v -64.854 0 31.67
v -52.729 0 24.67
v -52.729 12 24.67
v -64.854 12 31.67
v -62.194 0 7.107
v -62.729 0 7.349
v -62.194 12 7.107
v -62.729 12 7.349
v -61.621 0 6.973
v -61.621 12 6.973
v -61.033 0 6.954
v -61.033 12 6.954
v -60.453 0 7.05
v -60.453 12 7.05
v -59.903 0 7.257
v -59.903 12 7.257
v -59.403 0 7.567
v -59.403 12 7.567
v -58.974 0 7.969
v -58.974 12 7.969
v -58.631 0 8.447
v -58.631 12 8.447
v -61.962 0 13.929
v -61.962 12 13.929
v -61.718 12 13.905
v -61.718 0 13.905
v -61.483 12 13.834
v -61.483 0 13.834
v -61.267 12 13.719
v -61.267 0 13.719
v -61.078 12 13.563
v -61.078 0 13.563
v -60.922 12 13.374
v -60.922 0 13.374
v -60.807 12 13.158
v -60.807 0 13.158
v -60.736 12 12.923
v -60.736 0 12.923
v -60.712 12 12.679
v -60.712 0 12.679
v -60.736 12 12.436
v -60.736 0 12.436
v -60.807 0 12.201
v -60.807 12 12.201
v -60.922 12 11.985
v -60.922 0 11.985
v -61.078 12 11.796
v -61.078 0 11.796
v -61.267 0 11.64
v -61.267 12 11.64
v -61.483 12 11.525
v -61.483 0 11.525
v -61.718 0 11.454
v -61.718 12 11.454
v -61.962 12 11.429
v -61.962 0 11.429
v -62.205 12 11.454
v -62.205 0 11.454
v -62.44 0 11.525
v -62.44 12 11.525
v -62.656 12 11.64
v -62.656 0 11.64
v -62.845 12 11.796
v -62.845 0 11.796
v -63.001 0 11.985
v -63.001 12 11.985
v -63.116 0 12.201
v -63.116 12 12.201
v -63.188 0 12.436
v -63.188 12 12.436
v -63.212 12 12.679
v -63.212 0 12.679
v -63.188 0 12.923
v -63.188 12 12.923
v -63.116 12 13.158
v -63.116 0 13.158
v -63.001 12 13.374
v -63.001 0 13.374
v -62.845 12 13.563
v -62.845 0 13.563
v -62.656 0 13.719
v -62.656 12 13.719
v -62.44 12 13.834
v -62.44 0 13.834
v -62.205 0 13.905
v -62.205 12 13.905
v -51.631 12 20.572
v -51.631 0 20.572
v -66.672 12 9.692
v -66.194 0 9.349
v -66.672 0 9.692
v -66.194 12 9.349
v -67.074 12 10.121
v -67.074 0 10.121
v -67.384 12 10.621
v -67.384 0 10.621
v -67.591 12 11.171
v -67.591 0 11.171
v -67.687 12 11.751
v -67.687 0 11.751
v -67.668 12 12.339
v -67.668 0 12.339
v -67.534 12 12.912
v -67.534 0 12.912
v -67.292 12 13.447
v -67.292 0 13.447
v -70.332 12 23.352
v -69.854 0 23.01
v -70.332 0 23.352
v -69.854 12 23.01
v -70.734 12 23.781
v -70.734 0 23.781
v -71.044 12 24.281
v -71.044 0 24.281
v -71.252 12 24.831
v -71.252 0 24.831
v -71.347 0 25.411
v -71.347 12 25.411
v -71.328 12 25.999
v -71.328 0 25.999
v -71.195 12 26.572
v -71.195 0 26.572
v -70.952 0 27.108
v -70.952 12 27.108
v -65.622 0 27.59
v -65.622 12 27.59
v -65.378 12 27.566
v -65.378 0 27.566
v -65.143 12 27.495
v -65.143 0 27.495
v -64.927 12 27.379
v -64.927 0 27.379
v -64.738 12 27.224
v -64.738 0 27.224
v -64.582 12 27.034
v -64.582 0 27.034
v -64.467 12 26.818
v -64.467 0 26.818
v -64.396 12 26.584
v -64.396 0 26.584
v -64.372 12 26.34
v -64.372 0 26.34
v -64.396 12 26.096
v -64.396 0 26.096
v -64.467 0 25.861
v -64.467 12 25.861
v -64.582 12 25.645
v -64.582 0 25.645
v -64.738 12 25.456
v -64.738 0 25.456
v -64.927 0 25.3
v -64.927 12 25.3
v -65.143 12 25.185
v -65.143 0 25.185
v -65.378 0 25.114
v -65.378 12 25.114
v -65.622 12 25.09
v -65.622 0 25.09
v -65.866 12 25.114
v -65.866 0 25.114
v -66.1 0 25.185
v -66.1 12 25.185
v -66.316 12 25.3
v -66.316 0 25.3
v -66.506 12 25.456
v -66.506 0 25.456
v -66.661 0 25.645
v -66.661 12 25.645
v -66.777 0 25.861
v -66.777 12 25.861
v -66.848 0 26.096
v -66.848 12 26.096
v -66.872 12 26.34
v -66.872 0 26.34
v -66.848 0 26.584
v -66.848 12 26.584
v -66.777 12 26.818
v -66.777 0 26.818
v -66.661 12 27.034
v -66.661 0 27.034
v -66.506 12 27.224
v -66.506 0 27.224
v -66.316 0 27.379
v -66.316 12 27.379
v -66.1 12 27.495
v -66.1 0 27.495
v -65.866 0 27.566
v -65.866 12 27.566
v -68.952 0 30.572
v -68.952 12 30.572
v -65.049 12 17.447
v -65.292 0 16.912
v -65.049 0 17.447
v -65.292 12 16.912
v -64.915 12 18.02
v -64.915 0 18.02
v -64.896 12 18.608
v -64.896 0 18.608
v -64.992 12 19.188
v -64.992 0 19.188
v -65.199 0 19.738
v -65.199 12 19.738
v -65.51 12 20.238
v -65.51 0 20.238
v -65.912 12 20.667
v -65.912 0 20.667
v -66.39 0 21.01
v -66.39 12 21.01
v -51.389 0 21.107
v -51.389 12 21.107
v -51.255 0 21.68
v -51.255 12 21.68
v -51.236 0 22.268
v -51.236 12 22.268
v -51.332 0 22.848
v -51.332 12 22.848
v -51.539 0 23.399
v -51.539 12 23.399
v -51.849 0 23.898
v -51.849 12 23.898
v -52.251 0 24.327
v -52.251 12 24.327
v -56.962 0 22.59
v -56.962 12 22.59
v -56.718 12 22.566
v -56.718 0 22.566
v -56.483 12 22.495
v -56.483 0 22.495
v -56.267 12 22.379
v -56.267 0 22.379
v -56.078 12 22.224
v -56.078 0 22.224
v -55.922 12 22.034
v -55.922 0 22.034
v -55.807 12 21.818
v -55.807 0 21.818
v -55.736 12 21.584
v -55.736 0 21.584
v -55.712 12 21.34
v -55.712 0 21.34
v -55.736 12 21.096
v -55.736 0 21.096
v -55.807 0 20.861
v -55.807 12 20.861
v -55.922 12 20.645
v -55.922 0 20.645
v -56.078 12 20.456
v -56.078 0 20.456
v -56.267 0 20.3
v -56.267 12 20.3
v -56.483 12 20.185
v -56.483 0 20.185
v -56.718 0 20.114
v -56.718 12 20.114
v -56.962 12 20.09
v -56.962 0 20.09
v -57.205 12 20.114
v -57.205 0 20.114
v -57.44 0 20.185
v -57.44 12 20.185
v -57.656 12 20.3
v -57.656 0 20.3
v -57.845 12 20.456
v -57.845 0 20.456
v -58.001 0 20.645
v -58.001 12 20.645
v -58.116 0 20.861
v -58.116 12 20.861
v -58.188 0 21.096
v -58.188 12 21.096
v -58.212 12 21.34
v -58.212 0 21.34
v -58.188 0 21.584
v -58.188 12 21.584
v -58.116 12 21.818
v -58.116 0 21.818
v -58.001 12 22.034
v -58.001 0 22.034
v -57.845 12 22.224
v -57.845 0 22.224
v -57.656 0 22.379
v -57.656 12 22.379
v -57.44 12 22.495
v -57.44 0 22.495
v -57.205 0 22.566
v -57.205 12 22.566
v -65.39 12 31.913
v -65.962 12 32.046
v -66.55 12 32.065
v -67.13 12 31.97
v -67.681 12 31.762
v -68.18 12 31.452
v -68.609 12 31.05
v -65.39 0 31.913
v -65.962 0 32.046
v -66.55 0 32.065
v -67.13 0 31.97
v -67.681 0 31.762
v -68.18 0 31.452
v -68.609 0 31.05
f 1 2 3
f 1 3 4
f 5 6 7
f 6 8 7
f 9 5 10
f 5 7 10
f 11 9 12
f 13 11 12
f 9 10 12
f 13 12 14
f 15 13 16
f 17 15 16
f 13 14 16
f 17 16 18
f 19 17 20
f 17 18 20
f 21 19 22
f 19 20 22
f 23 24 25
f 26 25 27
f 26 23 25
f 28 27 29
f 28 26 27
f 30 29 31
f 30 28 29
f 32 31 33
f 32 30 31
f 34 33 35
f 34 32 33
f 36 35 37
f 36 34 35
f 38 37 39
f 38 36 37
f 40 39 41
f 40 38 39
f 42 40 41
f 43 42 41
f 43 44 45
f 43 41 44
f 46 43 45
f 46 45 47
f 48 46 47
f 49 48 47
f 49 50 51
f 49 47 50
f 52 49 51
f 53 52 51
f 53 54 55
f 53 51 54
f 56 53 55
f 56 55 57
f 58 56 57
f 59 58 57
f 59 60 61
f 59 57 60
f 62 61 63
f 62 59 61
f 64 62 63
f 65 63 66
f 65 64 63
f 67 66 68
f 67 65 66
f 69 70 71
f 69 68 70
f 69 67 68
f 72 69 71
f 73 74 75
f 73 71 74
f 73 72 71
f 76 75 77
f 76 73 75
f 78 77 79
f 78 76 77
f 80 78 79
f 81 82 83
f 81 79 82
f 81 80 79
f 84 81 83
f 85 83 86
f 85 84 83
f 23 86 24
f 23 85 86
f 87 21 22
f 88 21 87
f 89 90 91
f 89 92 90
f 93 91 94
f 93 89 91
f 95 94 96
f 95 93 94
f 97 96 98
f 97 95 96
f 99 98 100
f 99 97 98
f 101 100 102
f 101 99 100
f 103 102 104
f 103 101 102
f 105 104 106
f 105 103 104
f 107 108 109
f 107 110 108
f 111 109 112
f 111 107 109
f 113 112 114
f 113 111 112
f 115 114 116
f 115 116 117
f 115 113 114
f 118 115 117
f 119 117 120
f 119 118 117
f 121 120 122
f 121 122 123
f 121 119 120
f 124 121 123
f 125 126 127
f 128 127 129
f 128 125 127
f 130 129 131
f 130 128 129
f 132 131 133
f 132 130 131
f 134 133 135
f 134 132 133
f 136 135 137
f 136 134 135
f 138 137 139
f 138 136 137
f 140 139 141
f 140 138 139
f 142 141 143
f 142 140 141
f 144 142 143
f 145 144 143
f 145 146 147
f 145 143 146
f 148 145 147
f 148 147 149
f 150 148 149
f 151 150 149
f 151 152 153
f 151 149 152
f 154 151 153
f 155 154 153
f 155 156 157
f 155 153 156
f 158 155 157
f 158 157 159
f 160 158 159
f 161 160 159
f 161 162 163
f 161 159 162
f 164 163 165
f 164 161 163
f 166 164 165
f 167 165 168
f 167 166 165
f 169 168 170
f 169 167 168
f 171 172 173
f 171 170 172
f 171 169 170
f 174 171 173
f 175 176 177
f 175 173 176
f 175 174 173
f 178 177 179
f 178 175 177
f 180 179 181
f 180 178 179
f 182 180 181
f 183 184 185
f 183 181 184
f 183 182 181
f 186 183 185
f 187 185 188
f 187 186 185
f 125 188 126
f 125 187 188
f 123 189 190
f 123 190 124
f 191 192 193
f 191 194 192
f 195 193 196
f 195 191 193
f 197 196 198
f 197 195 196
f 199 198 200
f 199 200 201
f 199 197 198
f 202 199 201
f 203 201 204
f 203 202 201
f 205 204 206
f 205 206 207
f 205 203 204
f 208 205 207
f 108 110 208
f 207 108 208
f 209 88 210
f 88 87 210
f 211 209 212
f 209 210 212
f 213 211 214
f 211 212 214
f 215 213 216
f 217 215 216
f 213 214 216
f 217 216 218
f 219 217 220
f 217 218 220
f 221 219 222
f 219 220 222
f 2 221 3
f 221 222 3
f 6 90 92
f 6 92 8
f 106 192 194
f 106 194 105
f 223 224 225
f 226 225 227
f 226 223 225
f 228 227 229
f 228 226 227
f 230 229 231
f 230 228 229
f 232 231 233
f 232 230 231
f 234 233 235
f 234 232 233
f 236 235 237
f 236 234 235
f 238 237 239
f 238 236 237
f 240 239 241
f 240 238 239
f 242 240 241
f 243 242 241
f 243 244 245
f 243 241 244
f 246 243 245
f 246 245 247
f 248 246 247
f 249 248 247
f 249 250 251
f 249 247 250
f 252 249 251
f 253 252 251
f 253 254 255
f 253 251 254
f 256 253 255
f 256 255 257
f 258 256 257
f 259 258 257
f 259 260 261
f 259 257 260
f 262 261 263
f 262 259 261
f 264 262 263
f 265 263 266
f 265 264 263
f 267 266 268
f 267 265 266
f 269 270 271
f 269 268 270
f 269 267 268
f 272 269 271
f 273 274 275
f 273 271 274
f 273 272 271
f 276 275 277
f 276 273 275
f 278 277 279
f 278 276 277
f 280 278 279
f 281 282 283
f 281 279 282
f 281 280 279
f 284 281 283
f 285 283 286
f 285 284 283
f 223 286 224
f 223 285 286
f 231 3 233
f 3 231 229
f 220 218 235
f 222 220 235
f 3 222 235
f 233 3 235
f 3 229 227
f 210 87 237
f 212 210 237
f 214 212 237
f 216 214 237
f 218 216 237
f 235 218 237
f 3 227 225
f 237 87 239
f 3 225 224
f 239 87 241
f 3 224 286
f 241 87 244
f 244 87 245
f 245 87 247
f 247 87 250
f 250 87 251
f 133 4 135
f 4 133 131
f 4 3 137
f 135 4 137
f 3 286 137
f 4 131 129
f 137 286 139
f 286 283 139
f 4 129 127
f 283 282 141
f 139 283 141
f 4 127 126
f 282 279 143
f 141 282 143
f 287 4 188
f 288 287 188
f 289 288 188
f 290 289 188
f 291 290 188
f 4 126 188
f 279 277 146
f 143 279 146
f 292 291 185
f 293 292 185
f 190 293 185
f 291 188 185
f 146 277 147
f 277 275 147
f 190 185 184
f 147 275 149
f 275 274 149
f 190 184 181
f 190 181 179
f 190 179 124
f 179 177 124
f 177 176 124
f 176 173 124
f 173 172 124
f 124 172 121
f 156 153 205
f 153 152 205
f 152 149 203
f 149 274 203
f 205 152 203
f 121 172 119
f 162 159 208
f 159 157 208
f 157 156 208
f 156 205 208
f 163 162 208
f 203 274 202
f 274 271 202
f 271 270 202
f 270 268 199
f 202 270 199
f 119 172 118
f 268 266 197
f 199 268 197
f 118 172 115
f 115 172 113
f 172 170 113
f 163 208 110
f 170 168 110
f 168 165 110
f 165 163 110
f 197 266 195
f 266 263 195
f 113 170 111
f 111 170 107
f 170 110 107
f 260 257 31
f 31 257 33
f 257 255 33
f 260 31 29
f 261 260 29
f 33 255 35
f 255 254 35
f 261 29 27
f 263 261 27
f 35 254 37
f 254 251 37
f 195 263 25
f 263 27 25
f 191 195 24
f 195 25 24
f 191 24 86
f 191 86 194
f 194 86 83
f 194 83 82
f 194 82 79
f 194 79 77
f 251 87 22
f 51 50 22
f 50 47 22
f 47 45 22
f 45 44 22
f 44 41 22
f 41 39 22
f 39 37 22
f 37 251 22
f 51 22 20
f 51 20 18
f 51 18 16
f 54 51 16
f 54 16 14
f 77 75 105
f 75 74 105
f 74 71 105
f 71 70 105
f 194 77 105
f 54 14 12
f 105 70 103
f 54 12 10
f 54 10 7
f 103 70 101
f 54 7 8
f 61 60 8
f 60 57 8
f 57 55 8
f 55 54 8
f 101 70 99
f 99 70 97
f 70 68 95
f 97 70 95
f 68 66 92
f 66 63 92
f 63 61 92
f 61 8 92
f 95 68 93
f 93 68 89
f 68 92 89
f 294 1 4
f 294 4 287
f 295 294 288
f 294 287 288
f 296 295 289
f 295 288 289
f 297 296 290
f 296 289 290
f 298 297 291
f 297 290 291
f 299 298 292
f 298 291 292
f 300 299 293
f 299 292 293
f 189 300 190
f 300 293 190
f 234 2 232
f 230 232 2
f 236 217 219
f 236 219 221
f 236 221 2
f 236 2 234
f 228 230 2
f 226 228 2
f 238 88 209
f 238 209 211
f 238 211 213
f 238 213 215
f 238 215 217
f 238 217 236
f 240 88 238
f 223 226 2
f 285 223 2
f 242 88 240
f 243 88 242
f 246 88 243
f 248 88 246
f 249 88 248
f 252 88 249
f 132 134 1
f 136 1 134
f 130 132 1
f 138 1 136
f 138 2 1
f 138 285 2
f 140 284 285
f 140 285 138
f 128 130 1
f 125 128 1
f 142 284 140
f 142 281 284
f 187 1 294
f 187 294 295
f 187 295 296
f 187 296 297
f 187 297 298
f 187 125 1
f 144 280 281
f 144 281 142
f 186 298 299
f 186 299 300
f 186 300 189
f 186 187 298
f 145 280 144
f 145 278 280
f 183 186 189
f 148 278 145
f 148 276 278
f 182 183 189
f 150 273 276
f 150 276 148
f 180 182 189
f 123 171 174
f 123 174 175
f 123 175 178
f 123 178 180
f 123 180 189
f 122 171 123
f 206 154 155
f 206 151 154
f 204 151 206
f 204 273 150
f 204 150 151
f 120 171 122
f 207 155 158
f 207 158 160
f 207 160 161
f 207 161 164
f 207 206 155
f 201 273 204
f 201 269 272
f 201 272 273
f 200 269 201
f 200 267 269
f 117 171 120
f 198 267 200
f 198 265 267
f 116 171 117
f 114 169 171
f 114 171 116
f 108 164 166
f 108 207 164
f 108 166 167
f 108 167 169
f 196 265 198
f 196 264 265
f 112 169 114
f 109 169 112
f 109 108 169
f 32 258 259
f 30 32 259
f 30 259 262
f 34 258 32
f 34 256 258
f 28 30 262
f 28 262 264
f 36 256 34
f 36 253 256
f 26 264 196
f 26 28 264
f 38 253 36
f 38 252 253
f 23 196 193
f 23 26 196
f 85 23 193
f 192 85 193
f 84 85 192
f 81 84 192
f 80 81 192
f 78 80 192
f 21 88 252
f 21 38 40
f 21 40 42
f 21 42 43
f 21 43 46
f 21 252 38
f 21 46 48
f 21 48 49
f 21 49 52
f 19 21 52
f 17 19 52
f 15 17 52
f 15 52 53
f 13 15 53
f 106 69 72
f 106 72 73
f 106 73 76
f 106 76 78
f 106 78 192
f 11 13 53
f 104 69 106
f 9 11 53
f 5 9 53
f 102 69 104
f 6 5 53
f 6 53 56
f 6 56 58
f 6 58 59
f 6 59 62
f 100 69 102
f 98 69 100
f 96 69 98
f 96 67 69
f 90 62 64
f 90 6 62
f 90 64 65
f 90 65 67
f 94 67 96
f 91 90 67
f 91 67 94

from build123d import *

# Parameters (mm, degrees)
SKETCH_3_R             = 1.25
EXTRUDE_3_DEPTH        = 12
FILLET_1_R             = 3
HOLE_WIZARD_M3_1_D     = 2.5
HOLE_WIZARD_M3_1_DEPTH = 12


with BuildPart() as part:
    # 草图3 → 凸台-拉伸3 (new body)
    with BuildSketch(Plane(origin=(0, 0, 0), x_dir=(1, 0, 0), z_dir=(0, 1, 0))):
        Polygon((-68.791651246, -10.849364905), (-60.131397208, -5.849364905), (-50.131397208, -23.169872981), (-67.451905284, -33.169872981), (-72.451905284, -24.509618943), (-63.791651246, -19.509618943), align=None)
        with Locations(Location((-56.961524227, -21.339745962, 0), (0, 0, 270))):
            Circle(SKETCH_3_R, mode=Mode.SUBTRACT)
        with Locations(Location((-61.961524227, -12.679491924, 0), (0, 0, 270))):
            Circle(SKETCH_3_R, mode=Mode.SUBTRACT)
        with Locations(Location((-65.621778265, -26.339745962, 0), (0, 0, 270))):
            Circle(SKETCH_3_R, mode=Mode.SUBTRACT)
    extrude(amount=EXTRUDE_3_DEPTH)

    # 圆角1
    fillet_1_edges = [part.edges().sort_by_distance(p)[0] for p in [
        (-68.791651246, 6, 10.849364905),
        (-60.131397208, 6, 5.849364905),
        (-50.131397208, 6, 23.169872981),
        (-67.451905284, 6, 33.169872981),
        (-72.451905284, 6, 24.509618943),
        (-63.791651246, 6, 19.509618943),
    ]]
    fillet(fillet_1_edges, radius=FILLET_1_R)

    # M3 螺纹孔1
    with Locations(Plane(origin=(-61.961524227, 12, 12.679491924), x_dir=(0, 0, 1), z_dir=(0, 1, 0))):
        with Locations((0, 0), (8.660254038, 5), (13.660254038, -3.660254038)):
            Hole(HOLE_WIZARD_M3_1_D / 2, depth=HOLE_WIZARD_M3_1_DEPTH)


solid = part.part
